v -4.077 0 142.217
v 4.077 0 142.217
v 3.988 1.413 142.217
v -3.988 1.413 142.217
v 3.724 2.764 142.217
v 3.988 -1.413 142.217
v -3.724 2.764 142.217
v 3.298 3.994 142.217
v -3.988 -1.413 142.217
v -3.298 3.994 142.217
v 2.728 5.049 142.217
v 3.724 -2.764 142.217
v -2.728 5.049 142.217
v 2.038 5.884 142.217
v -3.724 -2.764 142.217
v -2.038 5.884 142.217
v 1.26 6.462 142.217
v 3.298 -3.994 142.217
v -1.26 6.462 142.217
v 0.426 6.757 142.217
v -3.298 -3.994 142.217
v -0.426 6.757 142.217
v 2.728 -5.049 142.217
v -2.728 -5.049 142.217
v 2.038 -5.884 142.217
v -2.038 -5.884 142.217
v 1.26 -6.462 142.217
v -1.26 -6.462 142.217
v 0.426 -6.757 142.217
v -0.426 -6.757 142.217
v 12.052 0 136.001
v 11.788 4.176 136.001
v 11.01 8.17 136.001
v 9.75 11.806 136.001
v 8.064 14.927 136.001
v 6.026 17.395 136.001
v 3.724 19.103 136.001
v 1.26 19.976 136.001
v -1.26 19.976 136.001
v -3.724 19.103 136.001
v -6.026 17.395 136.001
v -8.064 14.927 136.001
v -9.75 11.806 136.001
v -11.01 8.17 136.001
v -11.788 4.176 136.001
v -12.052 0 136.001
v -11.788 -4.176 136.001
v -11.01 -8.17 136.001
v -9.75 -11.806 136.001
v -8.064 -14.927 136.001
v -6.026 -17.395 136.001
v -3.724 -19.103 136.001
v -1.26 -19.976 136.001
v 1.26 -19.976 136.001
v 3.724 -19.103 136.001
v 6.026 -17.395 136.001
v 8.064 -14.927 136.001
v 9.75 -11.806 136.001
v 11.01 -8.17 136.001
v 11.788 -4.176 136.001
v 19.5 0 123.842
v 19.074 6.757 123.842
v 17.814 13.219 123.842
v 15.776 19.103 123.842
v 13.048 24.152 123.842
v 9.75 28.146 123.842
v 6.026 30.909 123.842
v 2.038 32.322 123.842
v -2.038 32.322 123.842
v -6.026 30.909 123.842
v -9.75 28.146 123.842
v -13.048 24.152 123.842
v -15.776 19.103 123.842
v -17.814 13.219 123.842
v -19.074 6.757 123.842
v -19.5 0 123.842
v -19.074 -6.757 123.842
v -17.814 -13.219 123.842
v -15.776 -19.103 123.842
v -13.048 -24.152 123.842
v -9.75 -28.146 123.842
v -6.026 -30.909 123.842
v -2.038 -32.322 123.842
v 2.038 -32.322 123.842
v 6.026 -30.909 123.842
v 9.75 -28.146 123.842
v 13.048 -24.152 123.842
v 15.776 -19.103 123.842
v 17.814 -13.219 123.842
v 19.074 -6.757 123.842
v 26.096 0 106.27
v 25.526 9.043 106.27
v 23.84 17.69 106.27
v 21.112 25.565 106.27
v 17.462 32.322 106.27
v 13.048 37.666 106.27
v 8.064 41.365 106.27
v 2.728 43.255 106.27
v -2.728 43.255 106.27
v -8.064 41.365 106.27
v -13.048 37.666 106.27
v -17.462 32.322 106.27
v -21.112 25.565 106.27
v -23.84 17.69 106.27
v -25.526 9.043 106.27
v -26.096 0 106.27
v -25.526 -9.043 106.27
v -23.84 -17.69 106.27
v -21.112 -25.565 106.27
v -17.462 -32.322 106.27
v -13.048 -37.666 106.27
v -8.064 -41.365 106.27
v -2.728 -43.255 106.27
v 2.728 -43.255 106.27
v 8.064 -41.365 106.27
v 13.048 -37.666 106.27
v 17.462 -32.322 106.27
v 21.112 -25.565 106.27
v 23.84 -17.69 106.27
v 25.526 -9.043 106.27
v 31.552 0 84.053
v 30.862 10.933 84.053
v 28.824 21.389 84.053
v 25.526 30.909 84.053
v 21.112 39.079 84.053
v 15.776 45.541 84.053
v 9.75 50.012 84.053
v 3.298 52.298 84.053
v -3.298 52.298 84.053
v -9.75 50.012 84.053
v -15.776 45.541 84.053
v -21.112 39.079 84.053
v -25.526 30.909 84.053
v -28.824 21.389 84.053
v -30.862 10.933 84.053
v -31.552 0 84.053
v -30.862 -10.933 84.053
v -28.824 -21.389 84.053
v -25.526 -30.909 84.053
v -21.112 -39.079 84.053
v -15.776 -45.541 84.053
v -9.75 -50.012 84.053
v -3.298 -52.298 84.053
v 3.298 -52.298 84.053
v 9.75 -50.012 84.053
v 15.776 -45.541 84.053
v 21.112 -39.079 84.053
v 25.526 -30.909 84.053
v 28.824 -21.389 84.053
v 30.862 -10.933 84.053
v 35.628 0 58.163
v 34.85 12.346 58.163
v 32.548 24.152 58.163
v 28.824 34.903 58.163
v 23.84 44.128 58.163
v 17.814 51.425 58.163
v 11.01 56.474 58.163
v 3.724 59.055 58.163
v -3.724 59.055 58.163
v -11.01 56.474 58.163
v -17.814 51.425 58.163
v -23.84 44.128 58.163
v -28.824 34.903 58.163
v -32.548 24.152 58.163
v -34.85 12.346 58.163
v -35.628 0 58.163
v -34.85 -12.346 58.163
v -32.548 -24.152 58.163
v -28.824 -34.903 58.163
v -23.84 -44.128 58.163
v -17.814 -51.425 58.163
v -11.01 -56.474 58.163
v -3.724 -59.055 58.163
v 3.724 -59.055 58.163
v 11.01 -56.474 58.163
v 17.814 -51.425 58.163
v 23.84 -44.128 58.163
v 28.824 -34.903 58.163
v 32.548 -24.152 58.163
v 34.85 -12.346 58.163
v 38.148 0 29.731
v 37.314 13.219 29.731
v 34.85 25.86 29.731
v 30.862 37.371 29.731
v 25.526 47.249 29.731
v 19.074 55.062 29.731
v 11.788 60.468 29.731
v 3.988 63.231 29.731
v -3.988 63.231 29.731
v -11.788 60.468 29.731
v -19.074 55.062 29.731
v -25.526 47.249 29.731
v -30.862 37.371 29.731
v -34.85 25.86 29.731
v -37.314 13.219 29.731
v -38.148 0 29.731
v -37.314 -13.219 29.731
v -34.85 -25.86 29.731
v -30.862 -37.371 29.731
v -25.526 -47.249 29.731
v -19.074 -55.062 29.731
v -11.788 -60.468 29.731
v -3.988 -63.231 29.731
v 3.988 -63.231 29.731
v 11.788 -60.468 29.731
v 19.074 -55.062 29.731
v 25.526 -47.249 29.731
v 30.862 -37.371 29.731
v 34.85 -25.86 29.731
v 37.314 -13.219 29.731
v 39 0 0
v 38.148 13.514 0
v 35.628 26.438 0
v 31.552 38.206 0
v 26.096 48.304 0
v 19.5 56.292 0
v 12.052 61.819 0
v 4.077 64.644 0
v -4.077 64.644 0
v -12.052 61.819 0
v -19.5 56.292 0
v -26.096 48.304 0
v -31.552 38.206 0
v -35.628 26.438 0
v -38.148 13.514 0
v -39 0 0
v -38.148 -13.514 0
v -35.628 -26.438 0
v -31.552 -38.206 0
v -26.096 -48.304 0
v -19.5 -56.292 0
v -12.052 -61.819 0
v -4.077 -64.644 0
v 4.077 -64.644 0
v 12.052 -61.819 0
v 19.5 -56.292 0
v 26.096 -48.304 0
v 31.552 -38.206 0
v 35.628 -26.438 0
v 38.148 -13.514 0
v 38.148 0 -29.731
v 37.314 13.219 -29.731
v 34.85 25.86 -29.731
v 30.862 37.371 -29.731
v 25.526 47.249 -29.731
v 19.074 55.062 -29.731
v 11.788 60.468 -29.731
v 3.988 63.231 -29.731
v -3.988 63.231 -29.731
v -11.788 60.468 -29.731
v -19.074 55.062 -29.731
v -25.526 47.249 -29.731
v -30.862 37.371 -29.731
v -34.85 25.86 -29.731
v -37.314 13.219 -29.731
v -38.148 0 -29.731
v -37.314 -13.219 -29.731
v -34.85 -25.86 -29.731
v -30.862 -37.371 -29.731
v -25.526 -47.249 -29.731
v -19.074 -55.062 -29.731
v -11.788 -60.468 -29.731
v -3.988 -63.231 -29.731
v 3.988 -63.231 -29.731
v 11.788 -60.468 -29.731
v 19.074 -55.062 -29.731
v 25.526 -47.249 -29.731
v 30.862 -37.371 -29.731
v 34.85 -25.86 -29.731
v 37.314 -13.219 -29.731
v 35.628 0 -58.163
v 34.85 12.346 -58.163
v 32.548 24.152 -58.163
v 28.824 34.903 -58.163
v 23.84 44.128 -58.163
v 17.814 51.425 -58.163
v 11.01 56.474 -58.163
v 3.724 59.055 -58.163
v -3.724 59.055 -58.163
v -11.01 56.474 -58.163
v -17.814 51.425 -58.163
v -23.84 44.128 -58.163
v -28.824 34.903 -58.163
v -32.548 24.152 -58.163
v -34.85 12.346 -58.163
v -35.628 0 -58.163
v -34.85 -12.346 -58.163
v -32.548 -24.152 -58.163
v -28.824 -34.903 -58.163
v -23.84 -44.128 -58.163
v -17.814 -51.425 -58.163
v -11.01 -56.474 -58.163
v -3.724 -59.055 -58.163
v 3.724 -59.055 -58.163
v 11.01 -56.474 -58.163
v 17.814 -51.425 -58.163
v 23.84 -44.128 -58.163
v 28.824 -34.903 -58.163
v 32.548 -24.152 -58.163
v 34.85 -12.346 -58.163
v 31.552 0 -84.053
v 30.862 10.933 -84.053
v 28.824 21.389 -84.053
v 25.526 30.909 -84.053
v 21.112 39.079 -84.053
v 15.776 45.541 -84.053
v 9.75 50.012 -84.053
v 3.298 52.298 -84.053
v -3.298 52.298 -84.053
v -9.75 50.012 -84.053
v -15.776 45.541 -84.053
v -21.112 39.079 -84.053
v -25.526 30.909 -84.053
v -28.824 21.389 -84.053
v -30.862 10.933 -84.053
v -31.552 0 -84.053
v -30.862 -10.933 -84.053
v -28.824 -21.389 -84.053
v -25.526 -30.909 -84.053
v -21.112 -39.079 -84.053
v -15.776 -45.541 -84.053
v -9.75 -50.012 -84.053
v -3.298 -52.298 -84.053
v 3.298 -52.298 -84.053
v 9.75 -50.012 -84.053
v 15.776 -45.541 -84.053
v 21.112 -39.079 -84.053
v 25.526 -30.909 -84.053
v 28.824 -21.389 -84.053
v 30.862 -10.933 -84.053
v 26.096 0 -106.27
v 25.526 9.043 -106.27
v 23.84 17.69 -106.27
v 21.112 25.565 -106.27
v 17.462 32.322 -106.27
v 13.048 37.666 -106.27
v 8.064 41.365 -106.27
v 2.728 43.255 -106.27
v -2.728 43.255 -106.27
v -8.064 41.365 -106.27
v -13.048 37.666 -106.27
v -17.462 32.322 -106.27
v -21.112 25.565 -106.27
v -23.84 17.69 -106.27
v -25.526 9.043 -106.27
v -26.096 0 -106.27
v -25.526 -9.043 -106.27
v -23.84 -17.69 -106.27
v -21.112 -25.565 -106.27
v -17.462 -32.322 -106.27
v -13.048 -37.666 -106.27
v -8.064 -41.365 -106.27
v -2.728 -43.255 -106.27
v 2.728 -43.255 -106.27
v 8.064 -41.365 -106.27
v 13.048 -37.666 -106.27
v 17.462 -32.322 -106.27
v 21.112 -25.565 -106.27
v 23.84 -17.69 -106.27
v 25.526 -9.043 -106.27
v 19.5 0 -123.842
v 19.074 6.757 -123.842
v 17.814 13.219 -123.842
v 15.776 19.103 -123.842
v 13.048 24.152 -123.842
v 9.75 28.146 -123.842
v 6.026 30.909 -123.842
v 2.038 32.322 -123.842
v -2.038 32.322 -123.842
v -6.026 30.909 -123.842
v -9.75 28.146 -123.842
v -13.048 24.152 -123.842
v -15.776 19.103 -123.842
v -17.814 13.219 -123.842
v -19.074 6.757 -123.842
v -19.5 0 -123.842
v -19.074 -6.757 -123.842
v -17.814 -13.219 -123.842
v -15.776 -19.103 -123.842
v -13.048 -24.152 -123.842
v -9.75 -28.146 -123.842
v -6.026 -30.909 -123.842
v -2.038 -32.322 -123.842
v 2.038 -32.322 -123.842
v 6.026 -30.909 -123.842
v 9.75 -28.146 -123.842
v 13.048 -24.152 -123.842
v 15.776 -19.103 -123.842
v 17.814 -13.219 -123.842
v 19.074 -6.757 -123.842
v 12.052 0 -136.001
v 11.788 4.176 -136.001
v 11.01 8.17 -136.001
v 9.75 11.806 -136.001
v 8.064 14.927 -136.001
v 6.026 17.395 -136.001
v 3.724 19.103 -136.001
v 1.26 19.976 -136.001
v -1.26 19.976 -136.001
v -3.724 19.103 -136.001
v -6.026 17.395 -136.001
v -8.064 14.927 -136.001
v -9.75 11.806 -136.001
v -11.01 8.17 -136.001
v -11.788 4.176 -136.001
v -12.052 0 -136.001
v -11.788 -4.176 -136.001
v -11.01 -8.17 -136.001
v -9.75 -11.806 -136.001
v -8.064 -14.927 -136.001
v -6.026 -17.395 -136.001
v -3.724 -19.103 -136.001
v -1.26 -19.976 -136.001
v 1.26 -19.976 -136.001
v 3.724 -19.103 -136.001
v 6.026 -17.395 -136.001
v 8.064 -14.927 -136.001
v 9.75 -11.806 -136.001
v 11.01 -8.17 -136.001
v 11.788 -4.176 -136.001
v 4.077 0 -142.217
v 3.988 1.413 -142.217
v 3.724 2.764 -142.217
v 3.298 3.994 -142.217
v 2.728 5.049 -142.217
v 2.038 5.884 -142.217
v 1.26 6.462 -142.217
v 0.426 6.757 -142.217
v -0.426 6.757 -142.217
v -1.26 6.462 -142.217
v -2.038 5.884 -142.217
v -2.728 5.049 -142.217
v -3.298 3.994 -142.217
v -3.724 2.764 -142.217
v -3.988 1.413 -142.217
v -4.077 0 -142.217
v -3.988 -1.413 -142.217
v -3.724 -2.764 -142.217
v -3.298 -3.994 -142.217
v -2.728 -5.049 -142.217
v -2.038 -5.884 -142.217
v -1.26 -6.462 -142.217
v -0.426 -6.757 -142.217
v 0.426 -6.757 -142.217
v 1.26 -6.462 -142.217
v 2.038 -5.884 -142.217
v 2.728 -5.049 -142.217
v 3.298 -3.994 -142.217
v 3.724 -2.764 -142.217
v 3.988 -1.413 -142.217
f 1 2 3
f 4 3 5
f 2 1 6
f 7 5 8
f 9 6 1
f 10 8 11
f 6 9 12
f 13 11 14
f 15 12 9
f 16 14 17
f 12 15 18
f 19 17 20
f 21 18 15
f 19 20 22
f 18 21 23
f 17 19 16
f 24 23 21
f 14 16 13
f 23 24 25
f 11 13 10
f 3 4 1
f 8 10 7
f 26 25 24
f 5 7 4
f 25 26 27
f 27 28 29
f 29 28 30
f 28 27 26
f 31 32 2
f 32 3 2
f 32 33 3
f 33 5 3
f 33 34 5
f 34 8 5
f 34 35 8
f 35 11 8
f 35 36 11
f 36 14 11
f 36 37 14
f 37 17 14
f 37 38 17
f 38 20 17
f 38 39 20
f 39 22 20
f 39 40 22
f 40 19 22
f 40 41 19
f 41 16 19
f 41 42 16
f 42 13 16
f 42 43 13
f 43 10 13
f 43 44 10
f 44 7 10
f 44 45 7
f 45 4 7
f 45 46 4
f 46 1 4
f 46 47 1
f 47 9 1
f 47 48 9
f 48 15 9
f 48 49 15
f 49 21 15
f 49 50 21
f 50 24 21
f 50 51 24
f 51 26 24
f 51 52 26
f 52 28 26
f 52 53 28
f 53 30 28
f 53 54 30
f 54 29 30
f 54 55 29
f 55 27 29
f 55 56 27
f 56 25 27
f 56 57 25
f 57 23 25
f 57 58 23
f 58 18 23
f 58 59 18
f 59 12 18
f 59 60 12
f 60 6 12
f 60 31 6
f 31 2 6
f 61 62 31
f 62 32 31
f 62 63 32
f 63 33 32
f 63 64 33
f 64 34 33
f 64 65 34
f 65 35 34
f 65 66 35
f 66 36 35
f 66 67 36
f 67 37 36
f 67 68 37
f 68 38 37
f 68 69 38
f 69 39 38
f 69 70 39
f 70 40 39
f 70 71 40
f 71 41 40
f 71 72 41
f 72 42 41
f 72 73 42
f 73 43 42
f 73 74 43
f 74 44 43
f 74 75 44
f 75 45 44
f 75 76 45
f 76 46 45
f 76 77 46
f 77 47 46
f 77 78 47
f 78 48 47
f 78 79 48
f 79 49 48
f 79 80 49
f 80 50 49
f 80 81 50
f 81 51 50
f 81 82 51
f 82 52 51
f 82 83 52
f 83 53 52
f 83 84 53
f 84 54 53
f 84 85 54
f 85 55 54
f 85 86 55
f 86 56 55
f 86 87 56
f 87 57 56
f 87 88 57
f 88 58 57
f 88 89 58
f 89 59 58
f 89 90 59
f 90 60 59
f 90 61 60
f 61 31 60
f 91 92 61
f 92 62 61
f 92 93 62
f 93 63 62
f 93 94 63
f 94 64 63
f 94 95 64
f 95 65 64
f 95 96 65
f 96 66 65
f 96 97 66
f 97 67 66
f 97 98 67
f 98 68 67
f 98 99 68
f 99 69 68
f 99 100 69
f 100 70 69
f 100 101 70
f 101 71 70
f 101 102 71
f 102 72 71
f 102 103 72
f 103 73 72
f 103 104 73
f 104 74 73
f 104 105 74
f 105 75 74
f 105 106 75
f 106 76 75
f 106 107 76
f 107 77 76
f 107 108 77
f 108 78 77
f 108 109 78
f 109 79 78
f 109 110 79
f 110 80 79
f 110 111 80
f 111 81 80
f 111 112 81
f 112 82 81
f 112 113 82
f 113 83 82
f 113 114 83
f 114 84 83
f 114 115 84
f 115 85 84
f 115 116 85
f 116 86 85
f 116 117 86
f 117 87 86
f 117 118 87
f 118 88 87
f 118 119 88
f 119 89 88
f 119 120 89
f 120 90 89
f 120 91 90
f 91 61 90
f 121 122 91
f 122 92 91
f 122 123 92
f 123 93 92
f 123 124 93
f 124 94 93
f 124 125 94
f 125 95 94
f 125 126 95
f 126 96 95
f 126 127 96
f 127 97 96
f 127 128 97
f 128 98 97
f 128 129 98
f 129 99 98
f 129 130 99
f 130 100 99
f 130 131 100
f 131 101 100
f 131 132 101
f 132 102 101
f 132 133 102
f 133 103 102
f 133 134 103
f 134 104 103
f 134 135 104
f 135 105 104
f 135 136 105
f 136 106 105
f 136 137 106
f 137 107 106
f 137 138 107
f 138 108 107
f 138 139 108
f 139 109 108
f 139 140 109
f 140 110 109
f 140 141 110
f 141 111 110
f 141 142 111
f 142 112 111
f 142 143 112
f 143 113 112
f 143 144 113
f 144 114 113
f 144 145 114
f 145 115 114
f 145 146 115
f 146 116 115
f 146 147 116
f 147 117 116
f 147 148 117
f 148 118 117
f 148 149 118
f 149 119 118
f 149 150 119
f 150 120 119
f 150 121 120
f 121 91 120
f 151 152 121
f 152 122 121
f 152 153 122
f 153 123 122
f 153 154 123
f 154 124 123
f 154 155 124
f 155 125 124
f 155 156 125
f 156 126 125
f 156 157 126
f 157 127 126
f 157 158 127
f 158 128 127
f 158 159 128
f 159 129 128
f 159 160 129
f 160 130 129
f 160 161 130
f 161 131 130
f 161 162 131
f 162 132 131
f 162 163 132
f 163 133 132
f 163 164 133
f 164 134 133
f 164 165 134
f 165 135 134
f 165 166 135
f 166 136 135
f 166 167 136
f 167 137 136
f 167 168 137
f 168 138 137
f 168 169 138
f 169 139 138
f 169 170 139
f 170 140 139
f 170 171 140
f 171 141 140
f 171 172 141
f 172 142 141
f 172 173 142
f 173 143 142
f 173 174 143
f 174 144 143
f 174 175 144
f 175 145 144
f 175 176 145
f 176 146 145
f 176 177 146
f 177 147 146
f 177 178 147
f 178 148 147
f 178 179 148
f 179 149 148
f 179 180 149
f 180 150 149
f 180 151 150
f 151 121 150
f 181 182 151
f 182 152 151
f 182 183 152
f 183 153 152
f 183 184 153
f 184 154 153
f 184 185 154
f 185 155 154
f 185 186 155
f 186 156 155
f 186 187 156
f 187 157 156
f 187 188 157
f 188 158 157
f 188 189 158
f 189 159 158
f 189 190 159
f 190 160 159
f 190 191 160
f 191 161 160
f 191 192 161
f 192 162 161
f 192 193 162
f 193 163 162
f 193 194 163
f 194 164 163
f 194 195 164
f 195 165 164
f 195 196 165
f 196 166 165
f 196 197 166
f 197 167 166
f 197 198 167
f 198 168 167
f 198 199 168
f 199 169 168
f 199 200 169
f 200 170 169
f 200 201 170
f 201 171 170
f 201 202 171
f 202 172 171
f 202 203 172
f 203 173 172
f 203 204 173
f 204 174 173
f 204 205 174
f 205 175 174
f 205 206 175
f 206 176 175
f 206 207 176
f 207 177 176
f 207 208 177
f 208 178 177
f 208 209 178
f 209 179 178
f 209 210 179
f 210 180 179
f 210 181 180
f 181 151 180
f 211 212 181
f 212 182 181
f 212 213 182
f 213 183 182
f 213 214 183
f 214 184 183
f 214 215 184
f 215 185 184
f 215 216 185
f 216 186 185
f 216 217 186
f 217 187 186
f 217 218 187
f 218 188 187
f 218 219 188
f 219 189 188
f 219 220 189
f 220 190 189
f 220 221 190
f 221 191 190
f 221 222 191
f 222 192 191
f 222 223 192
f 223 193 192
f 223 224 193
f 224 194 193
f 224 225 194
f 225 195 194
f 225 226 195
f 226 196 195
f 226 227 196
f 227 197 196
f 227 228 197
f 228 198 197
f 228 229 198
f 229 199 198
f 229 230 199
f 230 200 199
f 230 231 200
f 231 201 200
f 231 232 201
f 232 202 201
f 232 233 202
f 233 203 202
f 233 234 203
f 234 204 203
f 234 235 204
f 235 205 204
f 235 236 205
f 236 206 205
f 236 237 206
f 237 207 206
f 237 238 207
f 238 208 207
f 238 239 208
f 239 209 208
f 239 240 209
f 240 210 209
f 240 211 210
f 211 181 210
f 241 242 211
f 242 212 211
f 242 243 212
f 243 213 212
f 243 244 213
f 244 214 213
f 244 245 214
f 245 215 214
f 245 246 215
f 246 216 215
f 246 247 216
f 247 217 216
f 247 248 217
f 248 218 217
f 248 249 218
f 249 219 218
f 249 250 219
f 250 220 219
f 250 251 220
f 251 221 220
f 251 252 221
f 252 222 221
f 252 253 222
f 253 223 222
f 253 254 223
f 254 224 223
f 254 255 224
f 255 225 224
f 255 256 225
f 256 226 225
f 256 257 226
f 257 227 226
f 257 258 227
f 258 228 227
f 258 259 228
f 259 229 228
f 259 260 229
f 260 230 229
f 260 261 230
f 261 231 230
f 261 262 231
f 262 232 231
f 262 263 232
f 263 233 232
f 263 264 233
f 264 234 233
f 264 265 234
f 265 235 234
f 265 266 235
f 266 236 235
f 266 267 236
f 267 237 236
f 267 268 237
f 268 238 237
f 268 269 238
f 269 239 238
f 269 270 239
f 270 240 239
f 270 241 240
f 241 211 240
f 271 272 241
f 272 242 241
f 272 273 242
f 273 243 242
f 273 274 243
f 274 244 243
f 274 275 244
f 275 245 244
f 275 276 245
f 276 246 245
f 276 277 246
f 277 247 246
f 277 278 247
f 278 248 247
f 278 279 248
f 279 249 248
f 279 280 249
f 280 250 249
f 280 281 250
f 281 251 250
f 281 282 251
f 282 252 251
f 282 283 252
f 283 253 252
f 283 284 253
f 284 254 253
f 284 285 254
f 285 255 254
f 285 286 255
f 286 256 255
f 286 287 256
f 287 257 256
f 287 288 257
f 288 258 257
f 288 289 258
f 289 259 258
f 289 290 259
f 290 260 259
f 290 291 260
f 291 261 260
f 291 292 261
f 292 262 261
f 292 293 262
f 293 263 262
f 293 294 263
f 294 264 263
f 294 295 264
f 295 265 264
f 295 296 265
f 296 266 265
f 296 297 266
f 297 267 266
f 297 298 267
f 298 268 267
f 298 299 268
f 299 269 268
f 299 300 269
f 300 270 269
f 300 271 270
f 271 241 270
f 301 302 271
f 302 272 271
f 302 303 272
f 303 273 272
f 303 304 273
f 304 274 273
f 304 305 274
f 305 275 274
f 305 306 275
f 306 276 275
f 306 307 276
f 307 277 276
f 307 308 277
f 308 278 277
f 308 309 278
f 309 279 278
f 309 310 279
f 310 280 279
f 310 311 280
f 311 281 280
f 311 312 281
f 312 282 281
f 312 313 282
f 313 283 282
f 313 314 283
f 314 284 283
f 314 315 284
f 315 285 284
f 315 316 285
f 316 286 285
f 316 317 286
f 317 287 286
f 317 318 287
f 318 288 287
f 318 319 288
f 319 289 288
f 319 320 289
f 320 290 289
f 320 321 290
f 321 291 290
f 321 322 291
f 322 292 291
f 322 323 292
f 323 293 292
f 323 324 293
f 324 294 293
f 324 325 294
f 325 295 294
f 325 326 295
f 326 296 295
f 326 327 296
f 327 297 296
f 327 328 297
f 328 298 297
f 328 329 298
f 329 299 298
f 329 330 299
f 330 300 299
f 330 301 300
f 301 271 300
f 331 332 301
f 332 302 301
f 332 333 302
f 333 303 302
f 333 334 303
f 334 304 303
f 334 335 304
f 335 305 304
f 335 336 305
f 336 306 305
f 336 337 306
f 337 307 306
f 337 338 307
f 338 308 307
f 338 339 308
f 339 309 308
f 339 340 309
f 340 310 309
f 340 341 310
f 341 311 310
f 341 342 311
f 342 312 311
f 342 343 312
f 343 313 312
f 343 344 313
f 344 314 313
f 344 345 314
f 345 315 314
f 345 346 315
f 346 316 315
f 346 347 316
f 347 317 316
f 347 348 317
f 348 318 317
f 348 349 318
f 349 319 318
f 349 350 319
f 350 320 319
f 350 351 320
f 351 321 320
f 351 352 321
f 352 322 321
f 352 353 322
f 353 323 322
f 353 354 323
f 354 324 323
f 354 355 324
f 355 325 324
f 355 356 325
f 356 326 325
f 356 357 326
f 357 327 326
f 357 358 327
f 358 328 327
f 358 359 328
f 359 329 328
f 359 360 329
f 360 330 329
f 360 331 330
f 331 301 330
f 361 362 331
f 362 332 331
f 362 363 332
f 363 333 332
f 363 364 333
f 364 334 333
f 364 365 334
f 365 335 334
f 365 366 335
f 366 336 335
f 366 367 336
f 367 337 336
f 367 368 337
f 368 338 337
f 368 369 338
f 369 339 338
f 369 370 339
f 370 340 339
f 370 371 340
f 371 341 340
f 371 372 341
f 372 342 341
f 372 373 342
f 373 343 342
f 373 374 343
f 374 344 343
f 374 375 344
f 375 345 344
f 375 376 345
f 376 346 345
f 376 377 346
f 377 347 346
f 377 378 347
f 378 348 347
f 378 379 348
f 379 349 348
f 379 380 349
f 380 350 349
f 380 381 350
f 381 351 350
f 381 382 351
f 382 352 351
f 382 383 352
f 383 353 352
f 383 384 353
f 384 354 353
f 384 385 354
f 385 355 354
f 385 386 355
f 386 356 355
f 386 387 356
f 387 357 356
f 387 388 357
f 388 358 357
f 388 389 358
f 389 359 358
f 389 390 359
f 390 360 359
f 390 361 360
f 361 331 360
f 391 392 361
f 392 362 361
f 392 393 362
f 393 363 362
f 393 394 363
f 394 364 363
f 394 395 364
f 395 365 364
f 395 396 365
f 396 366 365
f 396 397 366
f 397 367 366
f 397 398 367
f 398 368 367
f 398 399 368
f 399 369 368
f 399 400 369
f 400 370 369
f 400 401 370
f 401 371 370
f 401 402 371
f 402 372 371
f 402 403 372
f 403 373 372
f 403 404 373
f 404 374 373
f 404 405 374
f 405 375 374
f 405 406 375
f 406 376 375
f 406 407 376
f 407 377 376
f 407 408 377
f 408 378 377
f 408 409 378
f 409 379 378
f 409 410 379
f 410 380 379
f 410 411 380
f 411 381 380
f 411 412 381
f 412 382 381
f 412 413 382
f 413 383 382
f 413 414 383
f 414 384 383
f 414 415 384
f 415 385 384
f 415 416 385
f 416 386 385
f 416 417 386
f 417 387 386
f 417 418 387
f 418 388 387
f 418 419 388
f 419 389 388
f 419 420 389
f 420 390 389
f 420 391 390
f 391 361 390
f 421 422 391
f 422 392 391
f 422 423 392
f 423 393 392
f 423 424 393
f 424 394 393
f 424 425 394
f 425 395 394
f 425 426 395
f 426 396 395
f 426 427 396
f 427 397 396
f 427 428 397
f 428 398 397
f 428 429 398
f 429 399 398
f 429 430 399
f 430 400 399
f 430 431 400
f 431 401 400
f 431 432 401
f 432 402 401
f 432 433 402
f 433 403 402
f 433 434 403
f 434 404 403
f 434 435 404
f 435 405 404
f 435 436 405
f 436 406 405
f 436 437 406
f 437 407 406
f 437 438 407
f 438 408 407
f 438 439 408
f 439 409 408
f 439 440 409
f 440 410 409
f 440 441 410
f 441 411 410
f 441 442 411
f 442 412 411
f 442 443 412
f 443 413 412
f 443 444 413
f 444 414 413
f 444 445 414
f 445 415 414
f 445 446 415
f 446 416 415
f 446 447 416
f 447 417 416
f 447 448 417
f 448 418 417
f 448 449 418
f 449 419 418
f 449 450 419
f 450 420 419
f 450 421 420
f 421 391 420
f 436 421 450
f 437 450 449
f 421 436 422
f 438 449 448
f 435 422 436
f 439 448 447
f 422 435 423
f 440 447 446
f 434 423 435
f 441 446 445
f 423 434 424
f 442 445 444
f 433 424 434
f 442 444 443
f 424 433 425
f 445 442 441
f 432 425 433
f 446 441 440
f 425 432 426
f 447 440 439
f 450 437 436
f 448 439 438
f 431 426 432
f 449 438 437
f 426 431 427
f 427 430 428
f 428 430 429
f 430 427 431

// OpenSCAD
// Generated by SolidPython 1.0.1 on 2020-07-29 00:39:25


scale(v = [3, 5, 11]) {
	sphere(r = 13);
}
/***********************************************
*********      SolidPython code:      **********
************************************************
 
# import packages: SolidPython
from solid import *
from solid.utils import *
from itertools import chain, combinations


class Resize:

    def __init__(self, scad_file):
        self.scad_file = scad_file
        #self.scad_file = import_scad(scad_file)
        # cone/cylinder param:
        self.r1 = 0
        self.r2 = 0
        self.h = 0
        # rectangular prism param:
        self.w = 0
        self.l = 0
        # ellipse param:
        self.r = 0

    # import OpenScad code (file name corresponds to shape)


    # classify shape + parameters
    def assign(self, param1, param2, param3):
        if self.scad_file == 'cone.scad':
            self.r1 = param1
            self.r2 = param2
            self.h = param3
        elif self.scad_file == 'cylinder.scad':
            self.r1 = param1
            self.r2 = param2
            self.h = param3
        elif self.scad_file == 'rectangularPrism.scad':
            self.h = param1
            self.l = param2
            self.w = param3
        else:
            self.r = param1
            self.h = param2

    # resize parameters
    def iterate(self):
        x = range(3, 20, 2)
        i = 1
        if self.scad_file == 'cone.scad':
            tempList = list(combinations(x, 2))
            for temp in tempList:
                param1 = temp[0]
                param2 = temp[1]
                filepath = 'produced_scad_files/' + 'cone' + str(param1) + '_' + str(param2) + '_' + '.scad'
                scad_render_to_file(cylinder(h=param1, r1=param2, r2=0), filepath)

        elif self.scad_file == 'cylinder.scad':
            tempList = list(combinations(x, 3))
            for temp in tempList:
                param1 = temp[0]
                param2 = temp[1]
                filepath = 'produced_scad_files/' + 'cylinder' + str(param1) + '_' + str(param2) + '_' + '.scad'
                scad_render_to_file(cylinder(h=param1, r1=param2, r2=param2), filepath)

        elif self.scad_file == 'rectangularPrism.scad':
            tempList = list(combinations(x, 3))
            for temp in tempList:
                param1 = temp[0]
                param2 = temp[1]
                param3 = temp[2]
                filepath = 'produced_scad_files/' + 'rectangularPrism' + str(param1) + '_' + str(param2) + '_' + str(
                    param3) + '.scad'
                scad_render_to_file(cube(size=(param1, param2, param3)), filepath)

        elif self.scad_file == 'ellipse.scad':
            tempList = list(combinations(x, 4))
            for temp in tempList:
                param1 = temp[0]
                param2 = temp[1]
                param3 = temp[2]
                param4 = temp[3]
                filepath = 'produced_scad_files/' + 'ellipse' + str(param1) + '_' + str(param2) + '_' + str(param3) + '_' + str(param4) + '.scad'
                scad_render_to_file(scale([param1, param2, param3])(sphere(r=param4)), filepath)

    def render_to_scadfile(self):
        scad_render_to_file(scad, 'example.scad') 
 
************************************************/
